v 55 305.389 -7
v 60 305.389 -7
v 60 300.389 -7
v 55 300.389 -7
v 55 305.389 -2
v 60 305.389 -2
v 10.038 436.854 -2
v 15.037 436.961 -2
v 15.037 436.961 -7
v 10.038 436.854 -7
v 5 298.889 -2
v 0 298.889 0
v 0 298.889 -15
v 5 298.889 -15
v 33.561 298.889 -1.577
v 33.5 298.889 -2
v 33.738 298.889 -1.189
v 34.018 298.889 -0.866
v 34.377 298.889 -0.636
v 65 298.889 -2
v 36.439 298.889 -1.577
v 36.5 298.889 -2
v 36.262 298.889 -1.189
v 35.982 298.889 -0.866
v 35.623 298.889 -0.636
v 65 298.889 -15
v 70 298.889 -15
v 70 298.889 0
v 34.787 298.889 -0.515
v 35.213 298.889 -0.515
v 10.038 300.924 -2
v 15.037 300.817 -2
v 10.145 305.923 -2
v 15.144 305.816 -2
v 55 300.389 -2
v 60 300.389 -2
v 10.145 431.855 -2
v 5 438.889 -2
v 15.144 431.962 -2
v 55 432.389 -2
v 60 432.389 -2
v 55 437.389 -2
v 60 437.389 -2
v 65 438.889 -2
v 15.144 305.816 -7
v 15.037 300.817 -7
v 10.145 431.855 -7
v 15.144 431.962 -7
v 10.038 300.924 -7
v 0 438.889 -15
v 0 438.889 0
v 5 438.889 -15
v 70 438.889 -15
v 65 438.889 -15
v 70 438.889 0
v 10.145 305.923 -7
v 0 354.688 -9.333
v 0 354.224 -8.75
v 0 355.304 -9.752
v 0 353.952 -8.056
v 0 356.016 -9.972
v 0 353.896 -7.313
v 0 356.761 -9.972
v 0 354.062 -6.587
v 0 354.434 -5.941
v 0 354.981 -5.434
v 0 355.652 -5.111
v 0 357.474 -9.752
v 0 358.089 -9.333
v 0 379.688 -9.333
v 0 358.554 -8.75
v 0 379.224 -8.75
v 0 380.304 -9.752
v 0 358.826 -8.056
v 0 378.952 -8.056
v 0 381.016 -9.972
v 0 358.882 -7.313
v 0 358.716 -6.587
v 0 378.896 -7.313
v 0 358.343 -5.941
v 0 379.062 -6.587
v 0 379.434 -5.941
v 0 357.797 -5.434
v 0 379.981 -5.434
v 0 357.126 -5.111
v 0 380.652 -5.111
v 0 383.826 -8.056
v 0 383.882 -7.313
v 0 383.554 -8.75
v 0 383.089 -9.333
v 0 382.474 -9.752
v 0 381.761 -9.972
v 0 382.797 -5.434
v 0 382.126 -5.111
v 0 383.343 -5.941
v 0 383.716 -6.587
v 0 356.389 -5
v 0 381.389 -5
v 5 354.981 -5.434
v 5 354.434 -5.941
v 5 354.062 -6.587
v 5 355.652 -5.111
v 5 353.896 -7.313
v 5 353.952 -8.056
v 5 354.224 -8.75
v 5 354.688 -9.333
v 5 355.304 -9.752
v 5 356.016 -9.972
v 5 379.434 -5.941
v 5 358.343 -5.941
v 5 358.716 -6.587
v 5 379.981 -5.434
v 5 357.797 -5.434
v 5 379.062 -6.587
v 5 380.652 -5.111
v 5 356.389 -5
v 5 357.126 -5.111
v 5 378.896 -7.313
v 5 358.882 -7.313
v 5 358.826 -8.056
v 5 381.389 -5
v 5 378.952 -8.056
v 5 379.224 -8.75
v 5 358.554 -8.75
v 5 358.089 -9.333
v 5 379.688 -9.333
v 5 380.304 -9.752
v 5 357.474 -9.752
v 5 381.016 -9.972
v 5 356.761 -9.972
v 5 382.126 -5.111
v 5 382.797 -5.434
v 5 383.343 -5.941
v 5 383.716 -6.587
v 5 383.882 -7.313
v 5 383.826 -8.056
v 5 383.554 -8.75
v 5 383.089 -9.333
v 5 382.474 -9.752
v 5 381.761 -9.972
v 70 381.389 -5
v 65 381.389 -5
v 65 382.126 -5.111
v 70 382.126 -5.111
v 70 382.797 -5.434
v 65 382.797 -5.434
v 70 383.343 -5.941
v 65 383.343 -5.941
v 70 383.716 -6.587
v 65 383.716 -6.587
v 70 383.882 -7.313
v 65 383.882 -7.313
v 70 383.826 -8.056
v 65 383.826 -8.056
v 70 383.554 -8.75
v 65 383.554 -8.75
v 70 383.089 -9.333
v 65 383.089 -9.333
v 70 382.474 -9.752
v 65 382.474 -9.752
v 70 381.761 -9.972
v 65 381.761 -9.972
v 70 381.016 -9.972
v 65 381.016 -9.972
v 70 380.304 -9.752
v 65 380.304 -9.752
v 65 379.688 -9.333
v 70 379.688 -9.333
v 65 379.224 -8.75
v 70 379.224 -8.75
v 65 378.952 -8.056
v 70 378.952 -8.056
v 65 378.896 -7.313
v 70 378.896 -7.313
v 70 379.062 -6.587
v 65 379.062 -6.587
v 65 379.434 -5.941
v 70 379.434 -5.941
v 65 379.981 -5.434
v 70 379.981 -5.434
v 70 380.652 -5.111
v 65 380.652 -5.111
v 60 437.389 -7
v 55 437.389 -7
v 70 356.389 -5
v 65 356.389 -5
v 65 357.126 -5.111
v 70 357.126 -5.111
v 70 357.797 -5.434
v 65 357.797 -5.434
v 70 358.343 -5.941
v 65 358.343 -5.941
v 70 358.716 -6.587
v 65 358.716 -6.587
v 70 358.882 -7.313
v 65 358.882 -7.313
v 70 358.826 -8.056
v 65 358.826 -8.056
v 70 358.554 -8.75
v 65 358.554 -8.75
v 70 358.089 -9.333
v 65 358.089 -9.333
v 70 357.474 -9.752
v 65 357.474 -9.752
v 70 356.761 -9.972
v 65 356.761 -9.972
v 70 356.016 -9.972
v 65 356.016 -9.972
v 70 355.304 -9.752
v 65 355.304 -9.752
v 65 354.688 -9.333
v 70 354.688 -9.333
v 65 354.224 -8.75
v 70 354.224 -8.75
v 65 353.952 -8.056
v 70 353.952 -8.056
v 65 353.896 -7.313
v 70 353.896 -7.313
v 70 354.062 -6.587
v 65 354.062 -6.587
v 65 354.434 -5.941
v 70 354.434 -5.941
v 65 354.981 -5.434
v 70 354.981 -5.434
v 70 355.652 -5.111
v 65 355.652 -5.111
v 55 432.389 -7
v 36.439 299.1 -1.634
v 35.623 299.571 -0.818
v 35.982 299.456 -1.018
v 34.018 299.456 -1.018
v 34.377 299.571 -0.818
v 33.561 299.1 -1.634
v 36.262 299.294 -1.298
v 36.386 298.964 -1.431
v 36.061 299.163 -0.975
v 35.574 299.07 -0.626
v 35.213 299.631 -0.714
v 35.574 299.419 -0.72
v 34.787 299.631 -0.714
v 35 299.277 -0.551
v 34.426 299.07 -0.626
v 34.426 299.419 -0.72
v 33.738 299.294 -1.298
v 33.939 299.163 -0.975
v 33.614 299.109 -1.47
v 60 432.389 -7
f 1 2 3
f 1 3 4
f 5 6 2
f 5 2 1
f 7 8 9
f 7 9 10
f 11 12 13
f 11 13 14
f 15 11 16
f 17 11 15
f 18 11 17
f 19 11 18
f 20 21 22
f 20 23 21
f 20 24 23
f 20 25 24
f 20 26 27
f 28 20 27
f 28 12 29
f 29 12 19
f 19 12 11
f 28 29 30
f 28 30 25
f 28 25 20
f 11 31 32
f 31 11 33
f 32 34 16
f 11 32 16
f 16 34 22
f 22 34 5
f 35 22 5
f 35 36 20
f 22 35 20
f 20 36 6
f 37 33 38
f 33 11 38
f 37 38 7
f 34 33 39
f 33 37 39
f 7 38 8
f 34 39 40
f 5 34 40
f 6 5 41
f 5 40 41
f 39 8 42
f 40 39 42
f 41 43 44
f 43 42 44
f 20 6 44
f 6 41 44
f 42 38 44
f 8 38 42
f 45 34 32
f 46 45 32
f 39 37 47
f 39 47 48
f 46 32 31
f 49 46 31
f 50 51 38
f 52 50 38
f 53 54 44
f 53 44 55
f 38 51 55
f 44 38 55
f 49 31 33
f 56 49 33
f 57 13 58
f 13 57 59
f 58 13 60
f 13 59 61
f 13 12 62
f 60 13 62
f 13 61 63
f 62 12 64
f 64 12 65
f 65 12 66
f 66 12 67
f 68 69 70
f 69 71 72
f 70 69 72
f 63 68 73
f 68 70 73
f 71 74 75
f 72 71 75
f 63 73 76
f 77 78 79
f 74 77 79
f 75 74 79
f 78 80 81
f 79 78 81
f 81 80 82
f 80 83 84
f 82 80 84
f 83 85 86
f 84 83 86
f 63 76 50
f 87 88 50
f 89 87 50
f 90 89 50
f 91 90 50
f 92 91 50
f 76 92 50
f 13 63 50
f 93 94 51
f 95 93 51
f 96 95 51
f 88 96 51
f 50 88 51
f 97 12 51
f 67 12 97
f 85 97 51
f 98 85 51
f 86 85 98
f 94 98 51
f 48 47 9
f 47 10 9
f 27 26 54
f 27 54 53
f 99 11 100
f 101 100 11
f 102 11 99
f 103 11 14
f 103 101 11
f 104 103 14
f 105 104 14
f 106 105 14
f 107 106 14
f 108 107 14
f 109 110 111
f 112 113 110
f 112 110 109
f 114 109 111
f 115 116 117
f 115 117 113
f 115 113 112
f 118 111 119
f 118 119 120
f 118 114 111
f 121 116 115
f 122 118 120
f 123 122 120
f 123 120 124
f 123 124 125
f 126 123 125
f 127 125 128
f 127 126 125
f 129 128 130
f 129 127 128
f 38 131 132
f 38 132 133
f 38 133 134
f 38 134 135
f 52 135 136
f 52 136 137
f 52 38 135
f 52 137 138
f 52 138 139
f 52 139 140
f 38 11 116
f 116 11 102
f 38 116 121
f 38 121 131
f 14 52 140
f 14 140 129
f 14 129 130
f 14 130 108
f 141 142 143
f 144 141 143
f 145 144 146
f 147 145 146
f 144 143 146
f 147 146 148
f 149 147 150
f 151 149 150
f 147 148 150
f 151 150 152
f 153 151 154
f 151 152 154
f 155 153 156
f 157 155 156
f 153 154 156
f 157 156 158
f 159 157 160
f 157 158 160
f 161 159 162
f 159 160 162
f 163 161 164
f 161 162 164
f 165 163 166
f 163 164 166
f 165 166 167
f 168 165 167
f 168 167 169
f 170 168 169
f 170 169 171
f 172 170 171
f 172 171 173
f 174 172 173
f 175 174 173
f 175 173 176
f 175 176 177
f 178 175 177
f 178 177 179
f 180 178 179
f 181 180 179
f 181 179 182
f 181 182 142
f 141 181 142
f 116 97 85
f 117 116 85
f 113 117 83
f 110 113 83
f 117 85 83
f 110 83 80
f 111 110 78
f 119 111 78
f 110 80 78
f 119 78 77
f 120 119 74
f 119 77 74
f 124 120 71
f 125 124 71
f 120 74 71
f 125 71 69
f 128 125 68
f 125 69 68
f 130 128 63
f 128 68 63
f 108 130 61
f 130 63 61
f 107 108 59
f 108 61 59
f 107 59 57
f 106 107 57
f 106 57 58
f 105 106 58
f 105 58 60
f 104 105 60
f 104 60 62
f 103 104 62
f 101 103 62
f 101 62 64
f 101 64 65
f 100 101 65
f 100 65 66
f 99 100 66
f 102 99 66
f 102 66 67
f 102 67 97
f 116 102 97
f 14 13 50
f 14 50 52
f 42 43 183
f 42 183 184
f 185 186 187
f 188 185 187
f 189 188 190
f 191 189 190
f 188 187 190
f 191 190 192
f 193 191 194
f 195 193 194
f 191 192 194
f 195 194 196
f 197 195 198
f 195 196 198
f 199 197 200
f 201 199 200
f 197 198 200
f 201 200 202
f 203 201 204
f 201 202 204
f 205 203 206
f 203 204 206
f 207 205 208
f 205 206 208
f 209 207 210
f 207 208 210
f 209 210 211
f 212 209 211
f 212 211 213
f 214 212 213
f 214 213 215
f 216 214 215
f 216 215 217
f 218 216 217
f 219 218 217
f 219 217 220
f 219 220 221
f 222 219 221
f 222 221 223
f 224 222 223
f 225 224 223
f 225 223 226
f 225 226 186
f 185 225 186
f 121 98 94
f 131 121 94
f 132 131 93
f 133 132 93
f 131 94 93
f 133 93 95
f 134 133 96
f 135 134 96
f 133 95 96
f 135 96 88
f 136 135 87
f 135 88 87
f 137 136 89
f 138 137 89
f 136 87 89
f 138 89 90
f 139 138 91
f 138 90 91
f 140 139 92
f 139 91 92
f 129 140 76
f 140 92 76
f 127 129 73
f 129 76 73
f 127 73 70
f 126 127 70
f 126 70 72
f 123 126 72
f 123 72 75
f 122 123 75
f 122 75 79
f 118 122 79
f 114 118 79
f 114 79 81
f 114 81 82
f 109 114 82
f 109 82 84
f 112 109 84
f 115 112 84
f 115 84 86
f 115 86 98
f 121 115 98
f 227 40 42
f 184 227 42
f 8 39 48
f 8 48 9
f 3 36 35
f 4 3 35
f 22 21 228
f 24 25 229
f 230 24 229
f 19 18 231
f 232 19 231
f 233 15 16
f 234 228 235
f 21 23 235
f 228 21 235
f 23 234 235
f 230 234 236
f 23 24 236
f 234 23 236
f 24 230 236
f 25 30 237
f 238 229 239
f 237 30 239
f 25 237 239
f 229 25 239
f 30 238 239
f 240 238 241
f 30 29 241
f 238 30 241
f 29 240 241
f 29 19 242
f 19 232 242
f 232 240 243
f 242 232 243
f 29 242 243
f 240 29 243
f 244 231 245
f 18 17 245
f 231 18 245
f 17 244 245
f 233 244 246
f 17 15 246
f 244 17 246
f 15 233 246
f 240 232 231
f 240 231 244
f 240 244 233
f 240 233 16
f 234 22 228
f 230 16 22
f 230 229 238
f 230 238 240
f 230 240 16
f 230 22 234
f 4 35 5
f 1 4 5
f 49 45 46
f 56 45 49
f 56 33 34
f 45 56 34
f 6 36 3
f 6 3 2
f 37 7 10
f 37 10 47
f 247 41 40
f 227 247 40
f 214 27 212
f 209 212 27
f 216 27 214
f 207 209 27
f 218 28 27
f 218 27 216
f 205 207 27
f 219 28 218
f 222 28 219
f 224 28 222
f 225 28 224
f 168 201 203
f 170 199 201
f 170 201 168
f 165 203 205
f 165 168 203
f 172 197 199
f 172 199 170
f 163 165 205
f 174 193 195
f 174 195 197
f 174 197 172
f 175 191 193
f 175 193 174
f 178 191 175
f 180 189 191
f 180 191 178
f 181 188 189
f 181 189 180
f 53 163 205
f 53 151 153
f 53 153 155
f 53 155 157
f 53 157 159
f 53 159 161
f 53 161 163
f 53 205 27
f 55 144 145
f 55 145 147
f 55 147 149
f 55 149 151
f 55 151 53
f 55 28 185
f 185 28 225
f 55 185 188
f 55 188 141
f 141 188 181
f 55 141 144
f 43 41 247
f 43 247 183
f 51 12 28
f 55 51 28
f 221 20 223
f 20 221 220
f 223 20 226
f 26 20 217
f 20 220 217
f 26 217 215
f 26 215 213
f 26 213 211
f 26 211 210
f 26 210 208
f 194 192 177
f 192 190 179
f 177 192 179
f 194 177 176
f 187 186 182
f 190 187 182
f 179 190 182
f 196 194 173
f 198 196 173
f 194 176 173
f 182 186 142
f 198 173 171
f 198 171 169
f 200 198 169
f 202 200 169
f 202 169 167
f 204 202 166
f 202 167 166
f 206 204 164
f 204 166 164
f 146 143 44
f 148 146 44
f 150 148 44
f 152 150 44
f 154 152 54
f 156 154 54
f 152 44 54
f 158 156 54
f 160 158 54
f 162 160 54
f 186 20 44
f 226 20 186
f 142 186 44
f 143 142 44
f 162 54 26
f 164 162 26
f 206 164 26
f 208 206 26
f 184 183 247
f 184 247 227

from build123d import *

# Parameters (mm, degrees)
SKETCH2_W           = 70
SKETCH2_H           = 140
BOSS_EXTRUDE1_DEPTH = 15
SKETCH3_W           = 60
SKETCH3_H           = 130
CUT_EXTRUDE1_DEPTH  = 12.5
SKETCH4_W           = 60
SKETCH4_H           = 13
CUT_EXTRUDE2_DEPTH  = 141
SKETCH7_R           = 2.5
CUT_EXTRUDE5_DEPTH  = 71
CUT_REVOLVE1_ANGLE  = 30
SKETCH36_W          = 5
SKETCH36_H          = 5
BOSS_EXTRUDE2_DEPTH = 5


with BuildPart() as part:
    # Sketch2 → Boss-Extrude1 (new body)
    with BuildSketch(Plane.XY):
        with Locations((35, 368.888888889)):
            Rectangle(SKETCH2_W, SKETCH2_H)
    extrude(amount=-BOSS_EXTRUDE1_DEPTH)

    # Sketch3 → Cut-Extrude1 (cut)
    with BuildSketch(Plane(origin=(0, 0, -15), x_dir=(-1, 0, 0), z_dir=(0, 0, -1))):
        with Locations((-35, 368.888888889)):
            Rectangle(SKETCH3_W, SKETCH3_H)
    extrude(amount=-CUT_EXTRUDE1_DEPTH, mode=Mode.SUBTRACT)

    # Sketch4 → Cut-Extrude2 (cut, through all)
    with BuildSketch(Plane(origin=(0, 438.888888889, 0), x_dir=(1, 0, 0), z_dir=(0, 1, 0))):
        with Locations((35, 8.5)):
            Rectangle(SKETCH4_W, SKETCH4_H)
    extrude(amount=-CUT_EXTRUDE2_DEPTH, mode=Mode.SUBTRACT)

    # Sketch7 → Cut-Extrude5 (cut, through all)
    with BuildSketch(Plane.ZY):
        with Locations((-7.5, 381.388888889)):
            Circle(SKETCH7_R)
        with Locations((-7.5, 356.388888889)):
            Circle(SKETCH7_R)
    extrude(amount=-CUT_EXTRUDE5_DEPTH, mode=Mode.SUBTRACT)

    # Sketch32 → Cut-Revolve1 (revolve, cut)
    with BuildSketch(Plane.XZ.offset(-298.888888889)):
        with BuildLine():
            Line((33.5, -2), (36.5, -2))
            ThreePointArc((36.5, -2), (35, -0.5), (33.5, -2))
        make_face()
    revolve(axis=Axis((33.5, 298.888888889, -2), (-1, 0, 0)), revolution_arc=CUT_REVOLVE1_ANGLE, mode=Mode.SUBTRACT)

    # Sketch36 → Boss-Extrude2 (add)
    with BuildSketch(Plane(origin=(0, 0, -2), x_dir=(-1, 0, 0), z_dir=(0, 0, -1))):
        with Locations((-57.5, 434.888888889)):
            Rectangle(SKETCH36_W, SKETCH36_H)
        Polygon((-10.145008864, 431.85472827), (-15.143861036, 431.961858829), (-15.036730477, 436.960711001), (-10.037878305, 436.853580442), align=None)
        Polygon((-10.145008864, 305.923049508), (-15.143861036, 305.815918949), (-15.036730477, 300.817066777), (-10.037878305, 300.924197336), align=None)
        with Locations((-57.5, 302.888888889)):
            Rectangle(SKETCH36_W, SKETCH36_H)
    extrude(amount=BOSS_EXTRUDE2_DEPTH)


solid = part.part
